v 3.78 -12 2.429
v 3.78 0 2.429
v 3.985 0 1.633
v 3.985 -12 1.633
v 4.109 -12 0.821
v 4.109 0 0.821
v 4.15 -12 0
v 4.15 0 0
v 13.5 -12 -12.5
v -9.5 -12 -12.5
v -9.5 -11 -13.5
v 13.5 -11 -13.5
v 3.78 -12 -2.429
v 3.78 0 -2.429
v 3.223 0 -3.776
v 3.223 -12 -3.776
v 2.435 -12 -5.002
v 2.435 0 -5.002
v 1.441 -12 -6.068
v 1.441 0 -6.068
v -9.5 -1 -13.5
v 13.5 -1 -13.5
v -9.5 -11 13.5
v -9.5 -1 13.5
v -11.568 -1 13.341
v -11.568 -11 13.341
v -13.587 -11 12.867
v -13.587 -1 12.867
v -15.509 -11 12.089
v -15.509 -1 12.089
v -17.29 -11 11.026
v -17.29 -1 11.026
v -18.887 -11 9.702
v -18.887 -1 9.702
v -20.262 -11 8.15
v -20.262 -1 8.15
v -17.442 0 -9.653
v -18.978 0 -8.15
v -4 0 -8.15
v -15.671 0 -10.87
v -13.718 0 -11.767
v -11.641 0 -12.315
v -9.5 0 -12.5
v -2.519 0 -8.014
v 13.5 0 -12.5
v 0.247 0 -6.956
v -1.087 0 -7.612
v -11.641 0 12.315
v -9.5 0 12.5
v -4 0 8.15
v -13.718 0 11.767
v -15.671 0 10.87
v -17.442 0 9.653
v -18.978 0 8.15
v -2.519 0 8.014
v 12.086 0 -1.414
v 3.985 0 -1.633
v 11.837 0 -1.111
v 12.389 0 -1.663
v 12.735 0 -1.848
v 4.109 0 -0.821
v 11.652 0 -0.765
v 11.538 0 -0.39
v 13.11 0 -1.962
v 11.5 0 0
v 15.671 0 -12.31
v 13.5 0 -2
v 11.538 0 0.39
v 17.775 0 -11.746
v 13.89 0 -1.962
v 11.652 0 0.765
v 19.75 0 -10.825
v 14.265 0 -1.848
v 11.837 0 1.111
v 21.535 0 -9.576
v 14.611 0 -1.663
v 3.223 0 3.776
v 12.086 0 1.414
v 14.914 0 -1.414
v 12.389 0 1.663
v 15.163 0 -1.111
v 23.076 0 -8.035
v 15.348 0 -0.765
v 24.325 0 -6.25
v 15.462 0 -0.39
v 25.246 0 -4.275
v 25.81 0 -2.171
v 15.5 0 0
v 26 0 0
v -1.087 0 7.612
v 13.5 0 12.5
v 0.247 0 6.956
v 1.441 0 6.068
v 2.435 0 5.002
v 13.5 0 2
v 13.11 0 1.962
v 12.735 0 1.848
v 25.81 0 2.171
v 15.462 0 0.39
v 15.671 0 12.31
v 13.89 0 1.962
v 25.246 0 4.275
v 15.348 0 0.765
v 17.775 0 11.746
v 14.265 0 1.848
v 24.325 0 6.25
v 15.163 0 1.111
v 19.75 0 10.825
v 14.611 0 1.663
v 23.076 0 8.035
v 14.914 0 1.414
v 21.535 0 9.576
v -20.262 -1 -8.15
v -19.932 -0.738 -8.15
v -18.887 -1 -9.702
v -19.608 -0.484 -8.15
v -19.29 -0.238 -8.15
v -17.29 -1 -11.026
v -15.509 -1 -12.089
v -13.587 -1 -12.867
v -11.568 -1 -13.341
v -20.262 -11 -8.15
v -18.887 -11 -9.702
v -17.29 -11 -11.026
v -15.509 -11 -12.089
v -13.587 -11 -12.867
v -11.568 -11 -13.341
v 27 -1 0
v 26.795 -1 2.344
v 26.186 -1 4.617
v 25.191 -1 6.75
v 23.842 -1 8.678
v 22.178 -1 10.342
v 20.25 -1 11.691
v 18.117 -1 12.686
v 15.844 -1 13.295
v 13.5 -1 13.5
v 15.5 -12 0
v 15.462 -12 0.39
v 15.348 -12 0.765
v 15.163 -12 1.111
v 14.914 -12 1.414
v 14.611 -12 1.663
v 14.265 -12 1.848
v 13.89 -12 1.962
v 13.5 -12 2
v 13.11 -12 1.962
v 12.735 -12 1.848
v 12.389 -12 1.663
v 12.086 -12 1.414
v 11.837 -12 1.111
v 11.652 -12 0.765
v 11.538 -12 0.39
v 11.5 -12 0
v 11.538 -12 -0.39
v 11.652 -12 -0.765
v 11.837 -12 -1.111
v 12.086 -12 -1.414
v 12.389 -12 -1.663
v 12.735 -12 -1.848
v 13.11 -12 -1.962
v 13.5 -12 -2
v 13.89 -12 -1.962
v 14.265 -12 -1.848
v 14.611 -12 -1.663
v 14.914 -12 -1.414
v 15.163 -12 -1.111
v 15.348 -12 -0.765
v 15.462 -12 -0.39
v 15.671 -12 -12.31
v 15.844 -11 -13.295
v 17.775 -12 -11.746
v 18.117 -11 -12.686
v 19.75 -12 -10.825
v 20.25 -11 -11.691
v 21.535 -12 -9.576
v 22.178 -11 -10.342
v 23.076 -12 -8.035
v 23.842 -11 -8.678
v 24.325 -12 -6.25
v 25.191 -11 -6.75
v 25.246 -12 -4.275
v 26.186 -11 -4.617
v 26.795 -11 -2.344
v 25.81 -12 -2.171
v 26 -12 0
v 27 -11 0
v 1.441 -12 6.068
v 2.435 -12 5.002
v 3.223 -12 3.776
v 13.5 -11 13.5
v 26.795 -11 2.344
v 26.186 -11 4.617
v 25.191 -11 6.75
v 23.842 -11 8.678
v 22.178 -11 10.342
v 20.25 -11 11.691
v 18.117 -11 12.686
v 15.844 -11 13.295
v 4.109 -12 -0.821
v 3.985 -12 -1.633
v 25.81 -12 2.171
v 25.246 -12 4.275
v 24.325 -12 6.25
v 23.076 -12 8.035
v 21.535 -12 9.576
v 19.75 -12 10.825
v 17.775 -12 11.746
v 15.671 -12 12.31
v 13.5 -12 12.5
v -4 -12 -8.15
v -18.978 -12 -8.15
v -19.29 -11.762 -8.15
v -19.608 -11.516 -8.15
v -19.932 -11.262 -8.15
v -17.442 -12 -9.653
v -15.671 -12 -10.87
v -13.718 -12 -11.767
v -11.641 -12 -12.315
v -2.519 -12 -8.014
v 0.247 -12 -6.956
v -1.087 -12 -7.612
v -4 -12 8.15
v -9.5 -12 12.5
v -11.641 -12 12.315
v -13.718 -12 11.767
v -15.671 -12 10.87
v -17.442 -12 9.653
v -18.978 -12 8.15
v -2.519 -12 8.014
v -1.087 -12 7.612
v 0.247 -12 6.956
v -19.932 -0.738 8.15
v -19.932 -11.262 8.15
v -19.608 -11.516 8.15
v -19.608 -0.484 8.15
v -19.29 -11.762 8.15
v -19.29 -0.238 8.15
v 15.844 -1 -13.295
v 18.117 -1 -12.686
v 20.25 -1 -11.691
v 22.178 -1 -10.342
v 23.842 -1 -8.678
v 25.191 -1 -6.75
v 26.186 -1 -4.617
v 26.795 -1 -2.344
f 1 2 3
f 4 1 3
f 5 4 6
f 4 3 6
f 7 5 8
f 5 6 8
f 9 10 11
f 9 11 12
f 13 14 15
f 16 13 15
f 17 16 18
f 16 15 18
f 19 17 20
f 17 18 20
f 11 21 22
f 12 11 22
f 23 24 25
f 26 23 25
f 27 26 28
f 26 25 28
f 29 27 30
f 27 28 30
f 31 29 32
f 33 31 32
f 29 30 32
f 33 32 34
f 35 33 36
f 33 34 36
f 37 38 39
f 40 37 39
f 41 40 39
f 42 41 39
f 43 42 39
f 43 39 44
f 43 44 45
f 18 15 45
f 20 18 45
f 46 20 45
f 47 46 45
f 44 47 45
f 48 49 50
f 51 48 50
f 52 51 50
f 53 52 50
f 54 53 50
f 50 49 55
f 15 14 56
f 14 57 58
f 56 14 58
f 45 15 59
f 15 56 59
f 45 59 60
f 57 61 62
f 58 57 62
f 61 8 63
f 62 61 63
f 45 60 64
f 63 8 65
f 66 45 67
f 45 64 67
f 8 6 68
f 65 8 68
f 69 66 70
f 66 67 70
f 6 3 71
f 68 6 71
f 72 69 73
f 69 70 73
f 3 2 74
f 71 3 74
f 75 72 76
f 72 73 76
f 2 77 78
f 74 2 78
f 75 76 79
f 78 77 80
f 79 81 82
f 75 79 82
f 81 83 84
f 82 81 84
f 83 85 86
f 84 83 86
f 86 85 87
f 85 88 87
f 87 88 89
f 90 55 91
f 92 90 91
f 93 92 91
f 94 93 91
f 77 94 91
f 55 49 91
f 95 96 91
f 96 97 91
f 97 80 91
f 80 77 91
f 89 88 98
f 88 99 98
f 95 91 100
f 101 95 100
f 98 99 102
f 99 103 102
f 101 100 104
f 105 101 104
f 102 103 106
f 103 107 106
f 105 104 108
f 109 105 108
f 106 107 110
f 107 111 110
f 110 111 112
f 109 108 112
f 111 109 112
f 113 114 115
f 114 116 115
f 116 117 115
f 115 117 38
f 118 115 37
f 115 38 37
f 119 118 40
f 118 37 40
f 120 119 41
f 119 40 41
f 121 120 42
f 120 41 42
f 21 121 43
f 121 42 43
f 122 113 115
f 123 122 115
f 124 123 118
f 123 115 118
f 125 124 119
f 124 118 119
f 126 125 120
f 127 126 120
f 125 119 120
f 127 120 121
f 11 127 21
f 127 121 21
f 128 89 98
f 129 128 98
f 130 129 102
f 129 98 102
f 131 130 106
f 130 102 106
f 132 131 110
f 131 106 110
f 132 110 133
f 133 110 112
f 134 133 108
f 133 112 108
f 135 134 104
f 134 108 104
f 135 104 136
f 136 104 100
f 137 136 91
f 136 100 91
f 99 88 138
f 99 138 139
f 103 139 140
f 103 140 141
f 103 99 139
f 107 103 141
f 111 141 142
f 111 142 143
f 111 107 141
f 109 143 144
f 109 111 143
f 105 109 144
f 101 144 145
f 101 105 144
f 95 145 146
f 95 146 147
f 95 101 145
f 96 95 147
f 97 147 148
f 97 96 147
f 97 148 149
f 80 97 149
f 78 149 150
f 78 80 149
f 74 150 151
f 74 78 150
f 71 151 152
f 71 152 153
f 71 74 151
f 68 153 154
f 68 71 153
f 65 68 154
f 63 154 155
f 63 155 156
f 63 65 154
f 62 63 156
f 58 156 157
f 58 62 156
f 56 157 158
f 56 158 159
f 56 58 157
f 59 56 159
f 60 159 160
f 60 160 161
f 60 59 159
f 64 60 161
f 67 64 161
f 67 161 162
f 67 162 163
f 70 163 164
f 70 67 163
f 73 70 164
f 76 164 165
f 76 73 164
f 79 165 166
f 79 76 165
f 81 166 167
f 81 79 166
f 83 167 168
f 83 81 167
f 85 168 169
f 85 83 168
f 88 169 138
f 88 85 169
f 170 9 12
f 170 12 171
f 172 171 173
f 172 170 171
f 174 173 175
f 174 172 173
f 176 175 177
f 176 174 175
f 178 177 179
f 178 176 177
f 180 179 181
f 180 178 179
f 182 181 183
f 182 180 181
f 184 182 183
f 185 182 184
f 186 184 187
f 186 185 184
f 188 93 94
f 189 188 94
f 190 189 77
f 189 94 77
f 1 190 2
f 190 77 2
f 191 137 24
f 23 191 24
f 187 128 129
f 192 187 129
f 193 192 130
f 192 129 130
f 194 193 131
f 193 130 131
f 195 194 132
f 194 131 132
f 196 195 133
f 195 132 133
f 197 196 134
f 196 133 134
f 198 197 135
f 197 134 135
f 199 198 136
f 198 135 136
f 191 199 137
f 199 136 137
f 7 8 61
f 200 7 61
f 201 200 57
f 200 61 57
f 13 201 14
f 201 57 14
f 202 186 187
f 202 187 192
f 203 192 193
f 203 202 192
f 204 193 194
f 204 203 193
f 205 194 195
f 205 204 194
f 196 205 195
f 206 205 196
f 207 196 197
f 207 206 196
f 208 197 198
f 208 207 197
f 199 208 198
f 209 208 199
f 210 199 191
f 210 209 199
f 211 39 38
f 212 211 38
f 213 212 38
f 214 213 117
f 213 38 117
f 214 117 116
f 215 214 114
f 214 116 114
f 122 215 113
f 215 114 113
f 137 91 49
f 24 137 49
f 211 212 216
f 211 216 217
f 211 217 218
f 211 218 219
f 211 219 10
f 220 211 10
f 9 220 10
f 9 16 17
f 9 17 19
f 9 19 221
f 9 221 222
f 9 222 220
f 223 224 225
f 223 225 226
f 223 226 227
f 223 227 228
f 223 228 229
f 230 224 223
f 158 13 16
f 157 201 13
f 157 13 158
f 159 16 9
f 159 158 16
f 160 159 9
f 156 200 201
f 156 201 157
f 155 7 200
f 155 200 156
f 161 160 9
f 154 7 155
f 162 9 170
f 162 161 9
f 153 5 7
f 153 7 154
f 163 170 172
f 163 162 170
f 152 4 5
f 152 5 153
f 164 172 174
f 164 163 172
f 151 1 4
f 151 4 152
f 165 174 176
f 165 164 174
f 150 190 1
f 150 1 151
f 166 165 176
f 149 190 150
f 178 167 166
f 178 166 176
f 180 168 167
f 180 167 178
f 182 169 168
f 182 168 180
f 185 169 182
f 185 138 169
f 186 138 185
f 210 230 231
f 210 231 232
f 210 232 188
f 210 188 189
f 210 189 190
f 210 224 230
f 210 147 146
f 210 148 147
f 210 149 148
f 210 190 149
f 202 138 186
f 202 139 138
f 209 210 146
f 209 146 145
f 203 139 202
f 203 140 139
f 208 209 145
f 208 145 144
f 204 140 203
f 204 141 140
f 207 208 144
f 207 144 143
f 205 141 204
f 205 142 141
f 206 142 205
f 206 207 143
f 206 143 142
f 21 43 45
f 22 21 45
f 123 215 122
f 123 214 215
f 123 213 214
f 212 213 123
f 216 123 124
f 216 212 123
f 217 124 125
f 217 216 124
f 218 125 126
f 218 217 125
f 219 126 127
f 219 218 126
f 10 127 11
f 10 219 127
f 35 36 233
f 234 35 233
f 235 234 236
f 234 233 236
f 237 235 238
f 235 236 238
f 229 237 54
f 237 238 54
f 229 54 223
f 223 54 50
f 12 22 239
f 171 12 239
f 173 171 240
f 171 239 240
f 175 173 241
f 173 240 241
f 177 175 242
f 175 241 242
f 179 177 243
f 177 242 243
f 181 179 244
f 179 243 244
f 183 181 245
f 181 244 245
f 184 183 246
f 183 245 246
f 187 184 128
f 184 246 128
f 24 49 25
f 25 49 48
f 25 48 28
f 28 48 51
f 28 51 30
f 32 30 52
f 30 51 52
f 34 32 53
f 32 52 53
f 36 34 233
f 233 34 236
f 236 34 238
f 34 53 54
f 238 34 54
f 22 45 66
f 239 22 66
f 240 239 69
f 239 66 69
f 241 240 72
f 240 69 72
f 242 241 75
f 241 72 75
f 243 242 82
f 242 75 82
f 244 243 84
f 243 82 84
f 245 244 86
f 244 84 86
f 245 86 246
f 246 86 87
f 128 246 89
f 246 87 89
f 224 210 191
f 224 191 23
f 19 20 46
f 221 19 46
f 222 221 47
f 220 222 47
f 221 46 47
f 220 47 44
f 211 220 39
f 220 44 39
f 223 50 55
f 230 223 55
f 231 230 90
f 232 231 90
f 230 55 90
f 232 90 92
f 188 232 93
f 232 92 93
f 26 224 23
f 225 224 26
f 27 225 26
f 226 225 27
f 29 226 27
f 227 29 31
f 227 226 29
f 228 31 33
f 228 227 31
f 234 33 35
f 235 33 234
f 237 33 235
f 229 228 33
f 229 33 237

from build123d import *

# Parameters (mm, degrees)
F0_R     = 2
F1_DEPTH = 12
F2_SIZE  = 1


with BuildPart() as f1:
    # F0 (on Front) → F1 (new body)
    with BuildSketch(Plane.XZ):
        with BuildLine():
            ThreePointArc((-9.5, -13.5), (-2.9124896759, -11.7836627468), (2, -7.0710678119))
            ThreePointArc((2, -7.0710678119), (1.7096518051, -6.5755371981), (1.4406428571, -6.0681055776))
            ThreePointArc((1.4406428571, -6.0681055776), (-1.087317427, -7.6117527698), (-4, -8.15))
            Line((-4, -8.15), (-20.2623185234, -8.15))
            ThreePointArc((-20.2623185234, -8.15), (-15.5093676872, -12.0887344251), (-9.5, -13.5))
        make_face()
        with BuildLine():
            Line((-9.5, -13.5), (13.5, -13.5))
            ThreePointArc((13.5, -13.5), (6.9124896759, -11.7836627468), (2, -7.0710678119))
            ThreePointArc((2, -7.0710678119), (-2.9124896759, -11.7836627468), (-9.5, -13.5))
        make_face()
        with BuildLine():
            ThreePointArc((1.4406428571, 6.0681055776), (1.7096518051, 6.5755371981), (2, 7.0710678119))
            ThreePointArc((2, 7.0710678119), (-2.9124896759, 11.7836627468), (-9.5, 13.5))
            ThreePointArc((-9.5, 13.5), (-15.5093676872, 12.0887344251), (-20.2623185234, 8.15))
            Line((-20.2623185234, 8.15), (-4, 8.15))
            ThreePointArc((-4, 8.15), (-1.087317427, 7.6117527698), (1.4406428571, 6.0681055776))
        make_face()
        with BuildLine():
            ThreePointArc((3.7797727273, 2.4285049541), (3.1054603873, 4.8324288328), (2, 7.0710678119))
            ThreePointArc((2, 7.0710678119), (1.7096518051, 6.5755371981), (1.4406428571, 6.0681055776))
            ThreePointArc((1.4406428571, 6.0681055776), (2.8561301206, 4.4063567456), (3.7797727273, 2.4285049541))
        make_face()
        with BuildLine():
            ThreePointArc((2, 7.0710678119), (6.9124896759, 11.7836627468), (13.5, 13.5))
            Line((13.5, 13.5), (-9.5, 13.5))
            ThreePointArc((-9.5, 13.5), (-2.9124896759, 11.7836627468), (2, 7.0710678119))
        make_face()
        with BuildLine():
            ThreePointArc((13.5, -13.5), (23.045941546, -9.545941546), (27, 0))
            ThreePointArc((27, 0), (23.045941546, 9.545941546), (13.5, 13.5))
            ThreePointArc((13.5, 13.5), (6.9124896759, 11.7836627468), (2, 7.0710678119))
            ThreePointArc((2, 7.0710678119), (3.1054603873, 4.8324288328), (3.7797727273, 2.4285049541))
            ThreePointArc((3.7797727273, 2.4285049541), (4.0569115586, 1.2282817822), (4.15, 0))
            ThreePointArc((4.15, 0), (4.0569115586, -1.2282817822), (3.7797727273, -2.4285049541))
            ThreePointArc((3.7797727273, -2.4285049541), (3.1054603873, -4.8324288328), (2, -7.0710678119))
            ThreePointArc((2, -7.0710678119), (6.9124896759, -11.7836627468), (13.5, -13.5))
        make_face()
        with Locations((13.5, 0)):
            Circle(F0_R, mode=Mode.SUBTRACT)
        with BuildLine():
            ThreePointArc((1.4406428571, -6.0681055776), (1.7096518051, -6.5755371981), (2, -7.0710678119))
            ThreePointArc((2, -7.0710678119), (3.1054603873, -4.8324288328), (3.7797727273, -2.4285049541))
            ThreePointArc((3.7797727273, -2.4285049541), (2.8561301206, -4.4063567456), (1.4406428571, -6.0681055776))
        make_face()
    extrude(amount=F1_DEPTH)

    # F2
    f2_edges = [f1.edges().sort_by_distance(p)[0] for p in [
        (27, -12, 0),
        (27, 0, 0),
        (-15.509368, 0, -12.088734),
        (-15.509368, -12, -12.088734),
        (2, 0, -13.5),
        (2, -12, -13.5),
        (2, 0, 13.5),
        (2, -12, 13.5),
        (-15.509368, 0, 12.088734),
        (-15.509368, -12, 12.088734),
    ]]
    chamfer(f2_edges, length=F2_SIZE)


solid = f1.part
